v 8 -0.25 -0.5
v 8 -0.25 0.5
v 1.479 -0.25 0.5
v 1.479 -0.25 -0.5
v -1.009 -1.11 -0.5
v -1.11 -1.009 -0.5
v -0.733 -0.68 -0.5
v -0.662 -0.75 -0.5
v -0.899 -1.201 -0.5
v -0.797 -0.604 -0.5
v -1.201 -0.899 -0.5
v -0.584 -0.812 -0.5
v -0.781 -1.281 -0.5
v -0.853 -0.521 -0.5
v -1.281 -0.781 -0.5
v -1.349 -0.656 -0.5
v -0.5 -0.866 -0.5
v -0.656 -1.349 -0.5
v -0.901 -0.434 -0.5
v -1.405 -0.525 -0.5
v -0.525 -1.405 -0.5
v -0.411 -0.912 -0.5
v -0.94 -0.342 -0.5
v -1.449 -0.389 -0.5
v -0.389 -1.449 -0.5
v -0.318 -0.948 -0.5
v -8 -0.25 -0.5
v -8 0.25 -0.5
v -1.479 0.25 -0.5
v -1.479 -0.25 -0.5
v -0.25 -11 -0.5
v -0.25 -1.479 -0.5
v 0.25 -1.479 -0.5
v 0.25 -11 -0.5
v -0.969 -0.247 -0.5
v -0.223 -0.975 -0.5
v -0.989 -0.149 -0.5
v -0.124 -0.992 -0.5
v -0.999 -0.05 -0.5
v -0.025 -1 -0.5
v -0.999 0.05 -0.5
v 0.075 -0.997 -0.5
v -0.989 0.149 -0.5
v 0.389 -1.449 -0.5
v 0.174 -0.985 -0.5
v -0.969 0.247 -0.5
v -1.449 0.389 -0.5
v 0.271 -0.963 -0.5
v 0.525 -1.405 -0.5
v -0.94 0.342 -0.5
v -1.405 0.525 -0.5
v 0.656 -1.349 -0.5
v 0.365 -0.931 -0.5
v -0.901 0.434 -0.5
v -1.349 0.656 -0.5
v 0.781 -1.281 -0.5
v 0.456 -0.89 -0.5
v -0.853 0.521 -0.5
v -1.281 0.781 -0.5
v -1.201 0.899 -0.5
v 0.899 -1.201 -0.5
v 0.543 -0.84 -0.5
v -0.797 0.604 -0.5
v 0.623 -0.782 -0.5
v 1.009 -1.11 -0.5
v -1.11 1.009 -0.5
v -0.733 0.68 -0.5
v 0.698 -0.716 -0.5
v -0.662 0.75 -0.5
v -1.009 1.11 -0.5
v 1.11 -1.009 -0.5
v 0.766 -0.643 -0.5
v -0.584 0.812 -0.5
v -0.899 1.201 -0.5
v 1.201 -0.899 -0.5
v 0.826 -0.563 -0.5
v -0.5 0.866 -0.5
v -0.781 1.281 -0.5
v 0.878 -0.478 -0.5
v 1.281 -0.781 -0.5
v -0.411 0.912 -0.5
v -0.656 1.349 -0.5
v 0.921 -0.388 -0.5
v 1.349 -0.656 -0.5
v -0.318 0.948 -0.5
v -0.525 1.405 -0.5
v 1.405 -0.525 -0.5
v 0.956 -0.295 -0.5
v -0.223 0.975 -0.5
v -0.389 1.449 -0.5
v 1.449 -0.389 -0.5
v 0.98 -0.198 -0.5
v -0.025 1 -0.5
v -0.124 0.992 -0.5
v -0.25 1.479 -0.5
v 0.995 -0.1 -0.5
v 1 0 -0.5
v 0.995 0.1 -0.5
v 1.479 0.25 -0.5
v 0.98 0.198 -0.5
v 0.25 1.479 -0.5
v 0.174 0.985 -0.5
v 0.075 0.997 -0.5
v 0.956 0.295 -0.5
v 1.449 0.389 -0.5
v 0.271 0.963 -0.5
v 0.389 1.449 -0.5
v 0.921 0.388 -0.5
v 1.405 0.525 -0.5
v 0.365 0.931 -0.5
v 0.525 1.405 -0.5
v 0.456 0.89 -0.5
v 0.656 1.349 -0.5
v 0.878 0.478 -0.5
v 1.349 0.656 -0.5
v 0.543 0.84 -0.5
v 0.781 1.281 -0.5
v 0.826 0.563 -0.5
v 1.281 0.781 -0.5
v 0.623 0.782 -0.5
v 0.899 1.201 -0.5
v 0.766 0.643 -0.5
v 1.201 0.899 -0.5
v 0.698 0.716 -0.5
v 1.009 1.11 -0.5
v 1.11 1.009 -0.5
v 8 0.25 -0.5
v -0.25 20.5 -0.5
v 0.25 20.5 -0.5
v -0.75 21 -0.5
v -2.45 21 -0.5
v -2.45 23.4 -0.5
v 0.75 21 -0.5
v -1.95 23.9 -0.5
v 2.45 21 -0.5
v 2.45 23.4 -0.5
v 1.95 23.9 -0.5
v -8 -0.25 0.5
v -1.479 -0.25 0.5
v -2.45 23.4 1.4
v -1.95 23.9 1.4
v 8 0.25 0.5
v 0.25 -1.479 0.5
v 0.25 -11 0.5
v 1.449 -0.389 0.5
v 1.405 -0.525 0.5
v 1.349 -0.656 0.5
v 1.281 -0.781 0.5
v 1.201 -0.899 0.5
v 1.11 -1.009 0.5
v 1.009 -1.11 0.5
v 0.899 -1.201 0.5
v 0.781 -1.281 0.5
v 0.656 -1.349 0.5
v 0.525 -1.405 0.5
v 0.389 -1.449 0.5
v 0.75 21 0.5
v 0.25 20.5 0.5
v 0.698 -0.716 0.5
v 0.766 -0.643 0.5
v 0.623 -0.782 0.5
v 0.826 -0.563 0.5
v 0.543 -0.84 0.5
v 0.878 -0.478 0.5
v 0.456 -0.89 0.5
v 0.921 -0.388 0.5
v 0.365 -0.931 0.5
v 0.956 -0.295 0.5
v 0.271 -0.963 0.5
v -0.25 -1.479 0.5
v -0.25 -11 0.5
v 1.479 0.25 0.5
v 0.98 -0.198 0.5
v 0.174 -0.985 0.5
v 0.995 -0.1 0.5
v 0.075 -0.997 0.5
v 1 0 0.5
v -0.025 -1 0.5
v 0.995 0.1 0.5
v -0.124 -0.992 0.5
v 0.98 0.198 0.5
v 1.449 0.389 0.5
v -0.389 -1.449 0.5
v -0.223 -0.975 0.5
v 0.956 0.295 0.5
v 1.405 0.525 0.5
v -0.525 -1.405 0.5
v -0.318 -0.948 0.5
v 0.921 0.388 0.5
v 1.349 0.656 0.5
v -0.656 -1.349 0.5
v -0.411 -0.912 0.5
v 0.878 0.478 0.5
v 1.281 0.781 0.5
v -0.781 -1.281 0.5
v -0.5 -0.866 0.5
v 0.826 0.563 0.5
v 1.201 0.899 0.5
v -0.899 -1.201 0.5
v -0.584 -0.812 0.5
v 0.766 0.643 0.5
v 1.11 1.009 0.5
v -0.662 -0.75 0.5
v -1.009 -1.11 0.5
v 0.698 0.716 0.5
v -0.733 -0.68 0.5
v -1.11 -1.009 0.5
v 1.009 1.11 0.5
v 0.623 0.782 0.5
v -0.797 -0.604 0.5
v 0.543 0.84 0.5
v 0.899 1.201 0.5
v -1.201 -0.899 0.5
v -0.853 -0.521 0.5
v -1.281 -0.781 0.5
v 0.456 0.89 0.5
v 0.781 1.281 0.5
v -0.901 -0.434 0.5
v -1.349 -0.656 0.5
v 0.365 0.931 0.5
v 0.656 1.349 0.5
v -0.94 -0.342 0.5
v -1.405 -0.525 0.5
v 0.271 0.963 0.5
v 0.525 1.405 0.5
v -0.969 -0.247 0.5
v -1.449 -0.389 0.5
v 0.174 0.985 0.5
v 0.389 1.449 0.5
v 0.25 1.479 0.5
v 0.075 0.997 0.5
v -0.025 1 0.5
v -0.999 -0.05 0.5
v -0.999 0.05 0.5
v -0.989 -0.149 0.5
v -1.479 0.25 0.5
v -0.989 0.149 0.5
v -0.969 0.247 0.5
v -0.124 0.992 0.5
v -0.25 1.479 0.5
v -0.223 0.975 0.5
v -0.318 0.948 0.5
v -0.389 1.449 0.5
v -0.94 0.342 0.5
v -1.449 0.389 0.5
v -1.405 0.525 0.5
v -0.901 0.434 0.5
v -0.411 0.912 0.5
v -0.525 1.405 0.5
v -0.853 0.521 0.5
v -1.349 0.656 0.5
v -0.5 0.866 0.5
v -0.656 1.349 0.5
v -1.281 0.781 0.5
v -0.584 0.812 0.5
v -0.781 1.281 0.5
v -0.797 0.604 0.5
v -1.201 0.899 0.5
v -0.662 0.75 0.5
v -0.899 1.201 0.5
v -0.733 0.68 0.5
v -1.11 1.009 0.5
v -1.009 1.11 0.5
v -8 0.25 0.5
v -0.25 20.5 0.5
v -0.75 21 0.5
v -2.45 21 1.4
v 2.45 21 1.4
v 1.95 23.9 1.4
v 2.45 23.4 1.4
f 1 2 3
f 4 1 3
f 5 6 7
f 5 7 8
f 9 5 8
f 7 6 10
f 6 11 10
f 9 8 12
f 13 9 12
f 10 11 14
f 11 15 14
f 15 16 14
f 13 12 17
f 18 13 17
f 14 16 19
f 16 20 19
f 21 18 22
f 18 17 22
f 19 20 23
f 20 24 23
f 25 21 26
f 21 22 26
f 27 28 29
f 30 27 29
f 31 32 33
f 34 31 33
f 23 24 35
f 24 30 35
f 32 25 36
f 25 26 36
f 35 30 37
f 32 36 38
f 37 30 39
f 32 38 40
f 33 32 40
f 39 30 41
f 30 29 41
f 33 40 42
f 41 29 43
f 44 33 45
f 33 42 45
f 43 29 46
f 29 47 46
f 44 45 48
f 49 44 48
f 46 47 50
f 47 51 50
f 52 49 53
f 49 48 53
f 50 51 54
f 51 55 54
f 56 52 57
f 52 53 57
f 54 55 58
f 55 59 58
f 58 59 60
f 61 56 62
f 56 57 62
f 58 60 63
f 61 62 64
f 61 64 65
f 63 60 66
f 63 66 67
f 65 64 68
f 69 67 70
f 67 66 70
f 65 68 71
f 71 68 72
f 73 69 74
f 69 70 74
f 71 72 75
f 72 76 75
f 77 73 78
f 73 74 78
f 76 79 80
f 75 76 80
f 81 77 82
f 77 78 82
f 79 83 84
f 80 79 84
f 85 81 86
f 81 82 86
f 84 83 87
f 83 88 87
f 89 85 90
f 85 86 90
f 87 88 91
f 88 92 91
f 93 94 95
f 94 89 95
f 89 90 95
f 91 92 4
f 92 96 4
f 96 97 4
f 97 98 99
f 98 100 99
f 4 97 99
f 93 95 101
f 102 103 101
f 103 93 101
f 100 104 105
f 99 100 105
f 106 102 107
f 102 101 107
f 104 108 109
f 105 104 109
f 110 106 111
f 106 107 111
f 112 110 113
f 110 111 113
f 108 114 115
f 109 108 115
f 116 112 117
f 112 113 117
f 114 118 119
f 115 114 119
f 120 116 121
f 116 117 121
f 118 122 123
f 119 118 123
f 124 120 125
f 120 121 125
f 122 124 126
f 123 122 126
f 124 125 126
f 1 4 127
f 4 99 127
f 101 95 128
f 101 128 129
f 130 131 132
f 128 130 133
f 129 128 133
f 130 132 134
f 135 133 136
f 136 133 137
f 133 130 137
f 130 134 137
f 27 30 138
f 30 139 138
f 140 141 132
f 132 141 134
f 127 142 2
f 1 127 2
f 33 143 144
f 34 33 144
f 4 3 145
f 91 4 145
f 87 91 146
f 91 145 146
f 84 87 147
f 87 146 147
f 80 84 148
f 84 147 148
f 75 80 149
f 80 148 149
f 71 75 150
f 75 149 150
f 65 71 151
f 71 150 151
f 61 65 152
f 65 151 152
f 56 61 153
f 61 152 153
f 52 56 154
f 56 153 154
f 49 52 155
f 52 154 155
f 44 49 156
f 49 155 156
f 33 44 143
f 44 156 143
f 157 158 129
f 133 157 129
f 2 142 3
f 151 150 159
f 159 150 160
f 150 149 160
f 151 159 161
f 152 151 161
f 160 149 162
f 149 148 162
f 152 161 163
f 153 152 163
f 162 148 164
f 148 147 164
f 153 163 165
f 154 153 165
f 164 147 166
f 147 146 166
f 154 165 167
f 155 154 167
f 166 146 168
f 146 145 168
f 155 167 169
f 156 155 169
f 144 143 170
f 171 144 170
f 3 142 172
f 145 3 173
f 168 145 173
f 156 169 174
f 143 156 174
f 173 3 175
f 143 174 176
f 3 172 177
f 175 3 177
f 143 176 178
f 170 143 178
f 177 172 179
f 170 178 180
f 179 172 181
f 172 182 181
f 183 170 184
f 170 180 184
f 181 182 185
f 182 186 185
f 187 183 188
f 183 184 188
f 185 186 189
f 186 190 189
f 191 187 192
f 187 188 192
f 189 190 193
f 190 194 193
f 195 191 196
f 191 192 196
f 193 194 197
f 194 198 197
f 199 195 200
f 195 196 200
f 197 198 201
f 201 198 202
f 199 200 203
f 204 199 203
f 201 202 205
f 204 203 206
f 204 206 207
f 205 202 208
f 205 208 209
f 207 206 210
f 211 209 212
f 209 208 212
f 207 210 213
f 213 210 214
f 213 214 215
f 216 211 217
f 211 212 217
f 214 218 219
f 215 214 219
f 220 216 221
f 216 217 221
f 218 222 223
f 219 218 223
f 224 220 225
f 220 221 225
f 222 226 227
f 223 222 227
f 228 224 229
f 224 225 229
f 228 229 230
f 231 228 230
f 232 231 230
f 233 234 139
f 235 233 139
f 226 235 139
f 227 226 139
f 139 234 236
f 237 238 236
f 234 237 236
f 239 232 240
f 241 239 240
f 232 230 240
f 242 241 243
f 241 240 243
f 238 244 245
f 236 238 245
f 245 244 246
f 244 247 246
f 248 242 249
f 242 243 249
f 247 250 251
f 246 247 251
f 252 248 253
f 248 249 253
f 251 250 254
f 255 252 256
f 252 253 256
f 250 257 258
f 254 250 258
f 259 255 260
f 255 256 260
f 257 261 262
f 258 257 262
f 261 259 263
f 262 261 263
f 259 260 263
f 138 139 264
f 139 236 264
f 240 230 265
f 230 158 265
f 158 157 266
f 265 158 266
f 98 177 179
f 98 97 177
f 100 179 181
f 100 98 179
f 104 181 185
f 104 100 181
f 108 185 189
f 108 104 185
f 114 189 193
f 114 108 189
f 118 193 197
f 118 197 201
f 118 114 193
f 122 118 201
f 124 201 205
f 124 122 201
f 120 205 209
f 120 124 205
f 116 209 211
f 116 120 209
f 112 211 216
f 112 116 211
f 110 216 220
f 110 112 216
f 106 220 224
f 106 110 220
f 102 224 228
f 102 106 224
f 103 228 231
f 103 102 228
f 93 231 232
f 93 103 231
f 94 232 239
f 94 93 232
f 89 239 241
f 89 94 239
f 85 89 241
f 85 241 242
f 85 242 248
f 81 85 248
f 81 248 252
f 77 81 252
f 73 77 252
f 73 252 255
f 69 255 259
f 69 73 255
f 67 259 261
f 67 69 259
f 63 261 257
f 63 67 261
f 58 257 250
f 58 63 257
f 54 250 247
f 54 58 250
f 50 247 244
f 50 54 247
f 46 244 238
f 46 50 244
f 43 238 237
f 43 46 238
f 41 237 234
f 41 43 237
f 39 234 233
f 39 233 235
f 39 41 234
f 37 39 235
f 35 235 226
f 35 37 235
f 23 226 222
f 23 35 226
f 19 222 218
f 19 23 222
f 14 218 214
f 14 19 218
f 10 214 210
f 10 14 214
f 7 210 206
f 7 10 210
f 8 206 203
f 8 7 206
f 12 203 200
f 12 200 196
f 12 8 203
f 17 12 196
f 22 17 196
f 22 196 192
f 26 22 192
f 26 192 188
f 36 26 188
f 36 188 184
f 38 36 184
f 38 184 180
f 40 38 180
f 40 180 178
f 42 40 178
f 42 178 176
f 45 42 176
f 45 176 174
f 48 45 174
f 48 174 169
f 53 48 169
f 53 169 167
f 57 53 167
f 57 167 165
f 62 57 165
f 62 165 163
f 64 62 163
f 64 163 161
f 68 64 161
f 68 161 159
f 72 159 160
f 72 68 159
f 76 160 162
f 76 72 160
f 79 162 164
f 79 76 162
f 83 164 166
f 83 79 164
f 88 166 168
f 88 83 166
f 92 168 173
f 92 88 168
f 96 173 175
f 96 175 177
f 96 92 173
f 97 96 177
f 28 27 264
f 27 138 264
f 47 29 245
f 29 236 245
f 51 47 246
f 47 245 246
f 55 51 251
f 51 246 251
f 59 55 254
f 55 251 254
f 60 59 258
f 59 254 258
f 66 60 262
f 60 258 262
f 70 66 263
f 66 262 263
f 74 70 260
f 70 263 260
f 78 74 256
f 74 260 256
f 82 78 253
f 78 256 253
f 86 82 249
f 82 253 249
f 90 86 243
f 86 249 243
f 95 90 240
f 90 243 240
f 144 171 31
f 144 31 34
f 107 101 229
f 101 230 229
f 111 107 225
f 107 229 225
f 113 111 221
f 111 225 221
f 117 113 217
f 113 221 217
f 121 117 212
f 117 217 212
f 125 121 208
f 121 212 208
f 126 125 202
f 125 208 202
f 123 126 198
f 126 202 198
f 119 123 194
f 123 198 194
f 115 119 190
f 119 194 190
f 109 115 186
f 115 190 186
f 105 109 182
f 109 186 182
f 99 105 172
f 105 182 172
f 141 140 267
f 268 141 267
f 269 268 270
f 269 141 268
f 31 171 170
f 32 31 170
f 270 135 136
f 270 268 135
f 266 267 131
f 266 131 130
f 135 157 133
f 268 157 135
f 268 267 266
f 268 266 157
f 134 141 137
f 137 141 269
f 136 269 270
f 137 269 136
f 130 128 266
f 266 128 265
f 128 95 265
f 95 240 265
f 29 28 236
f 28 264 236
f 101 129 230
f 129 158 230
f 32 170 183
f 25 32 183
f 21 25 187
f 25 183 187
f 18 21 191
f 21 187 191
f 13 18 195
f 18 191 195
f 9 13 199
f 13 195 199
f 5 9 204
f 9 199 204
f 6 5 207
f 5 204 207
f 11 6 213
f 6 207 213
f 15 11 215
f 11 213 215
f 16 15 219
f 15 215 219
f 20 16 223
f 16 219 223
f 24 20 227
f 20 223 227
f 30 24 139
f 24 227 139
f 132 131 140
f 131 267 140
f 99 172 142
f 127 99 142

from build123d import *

# Parameters (mm, degrees)
SKETCH_1_R          = 1
EXTRUDE_1_DEPTH     = 0.5
SKETCH_2_W          = 4.9
SKETCH_2_H          = 2.9
EXTRUDE_2_DEPTH     = 1.4
SKETCH_2_2_W        = 4.9
SKETCH_2_2_H        = 2.9
EXTRUDE_3_DEPTH     = 0.5
CHAMFER_1_SIZE      = 0.5
CHAMFER_2_SIZE      = 0.5
SKETCH_3_W          = 11.619186974
SKETCH_3_H          = 20
CUT_EXTRUDE_1_DEPTH = 5


with BuildPart() as part:
    # 스케치1 → 보스-돌출1 (new, symmetric)
    with BuildSketch(Plane.XY):
        with BuildLine():
            ThreePointArc((-0.25, -1.479019946), (-1.060660172, -1.060660172), (-1.479019946, -0.25))
            Line((-1.479019946, -0.25), (-8, -0.25))
            Line((-8, -0.25), (-8, 0.25))
            Line((-8, 0.25), (-1.479019946, 0.25))
            ThreePointArc((-1.479019946, 0.25), (-1.060660172, 1.060660172), (-0.25, 1.479019946))
            Line((-0.25, 1.479019946), (-0.25, 21))
            Line((-0.25, 21), (0.25, 21))
            Line((0.25, 21), (0.25, 1.479019946))
            ThreePointArc((0.25, 1.479019946), (1.060660172, 1.060660172), (1.479019946, 0.25))
            Line((1.479019946, 0.25), (8, 0.25))
            Line((8, 0.25), (8, -0.25))
            Line((8, -0.25), (1.479019946, -0.25))
            ThreePointArc((1.479019946, -0.25), (1.060660172, -1.060660172), (0.25, -1.479019946))
            Line((0.25, -1.479019946), (0.25, -21))
            Line((0.25, -21), (-0.25, -21))
            Line((-0.25, -21), (-0.25, -1.479019946))
        make_face()
        Circle(SKETCH_1_R, mode=Mode.SUBTRACT)
    extrude(amount=EXTRUDE_1_DEPTH, both=True)

    # 스케치2 → 보스-돌출2 (add)
    with BuildSketch(Plane.XY):
        with Locations((0, 22.45)):
            Rectangle(SKETCH_2_W, SKETCH_2_H)
    extrude(amount=EXTRUDE_2_DEPTH)

    # 스케치2<2> → 보스-돌출3 (add)
    with BuildSketch(Plane.XY):
        with Locations((0, 22.45)):
            Rectangle(SKETCH_2_2_W, SKETCH_2_2_H)
    extrude(amount=-EXTRUDE_3_DEPTH)

    # 모따기1
    chamfer_1_edges = [part.edges().sort_by_distance(p)[0] for p in [
        (2.45, 23.9, 0.45),
        (-2.45, 23.9, 0.45),
    ]]
    chamfer(chamfer_1_edges, length=CHAMFER_1_SIZE)

    # 모따기2
    chamfer_2_edges = [part.edges().sort_by_distance(p)[0] for p in [
        (-0.25, 21, 0),
        (0.25, 21, 0),
    ]]
    chamfer(chamfer_2_edges, length=CHAMFER_2_SIZE)

    # 스케치3 → 컷-돌출1 (cut, symmetric)
    with BuildSketch(Plane.XY):
        with Locations((0, -21)):
            Rectangle(SKETCH_3_W, SKETCH_3_H)
    extrude(amount=CUT_EXTRUDE_1_DEPTH, both=True, mode=Mode.SUBTRACT)


solid = part.part
